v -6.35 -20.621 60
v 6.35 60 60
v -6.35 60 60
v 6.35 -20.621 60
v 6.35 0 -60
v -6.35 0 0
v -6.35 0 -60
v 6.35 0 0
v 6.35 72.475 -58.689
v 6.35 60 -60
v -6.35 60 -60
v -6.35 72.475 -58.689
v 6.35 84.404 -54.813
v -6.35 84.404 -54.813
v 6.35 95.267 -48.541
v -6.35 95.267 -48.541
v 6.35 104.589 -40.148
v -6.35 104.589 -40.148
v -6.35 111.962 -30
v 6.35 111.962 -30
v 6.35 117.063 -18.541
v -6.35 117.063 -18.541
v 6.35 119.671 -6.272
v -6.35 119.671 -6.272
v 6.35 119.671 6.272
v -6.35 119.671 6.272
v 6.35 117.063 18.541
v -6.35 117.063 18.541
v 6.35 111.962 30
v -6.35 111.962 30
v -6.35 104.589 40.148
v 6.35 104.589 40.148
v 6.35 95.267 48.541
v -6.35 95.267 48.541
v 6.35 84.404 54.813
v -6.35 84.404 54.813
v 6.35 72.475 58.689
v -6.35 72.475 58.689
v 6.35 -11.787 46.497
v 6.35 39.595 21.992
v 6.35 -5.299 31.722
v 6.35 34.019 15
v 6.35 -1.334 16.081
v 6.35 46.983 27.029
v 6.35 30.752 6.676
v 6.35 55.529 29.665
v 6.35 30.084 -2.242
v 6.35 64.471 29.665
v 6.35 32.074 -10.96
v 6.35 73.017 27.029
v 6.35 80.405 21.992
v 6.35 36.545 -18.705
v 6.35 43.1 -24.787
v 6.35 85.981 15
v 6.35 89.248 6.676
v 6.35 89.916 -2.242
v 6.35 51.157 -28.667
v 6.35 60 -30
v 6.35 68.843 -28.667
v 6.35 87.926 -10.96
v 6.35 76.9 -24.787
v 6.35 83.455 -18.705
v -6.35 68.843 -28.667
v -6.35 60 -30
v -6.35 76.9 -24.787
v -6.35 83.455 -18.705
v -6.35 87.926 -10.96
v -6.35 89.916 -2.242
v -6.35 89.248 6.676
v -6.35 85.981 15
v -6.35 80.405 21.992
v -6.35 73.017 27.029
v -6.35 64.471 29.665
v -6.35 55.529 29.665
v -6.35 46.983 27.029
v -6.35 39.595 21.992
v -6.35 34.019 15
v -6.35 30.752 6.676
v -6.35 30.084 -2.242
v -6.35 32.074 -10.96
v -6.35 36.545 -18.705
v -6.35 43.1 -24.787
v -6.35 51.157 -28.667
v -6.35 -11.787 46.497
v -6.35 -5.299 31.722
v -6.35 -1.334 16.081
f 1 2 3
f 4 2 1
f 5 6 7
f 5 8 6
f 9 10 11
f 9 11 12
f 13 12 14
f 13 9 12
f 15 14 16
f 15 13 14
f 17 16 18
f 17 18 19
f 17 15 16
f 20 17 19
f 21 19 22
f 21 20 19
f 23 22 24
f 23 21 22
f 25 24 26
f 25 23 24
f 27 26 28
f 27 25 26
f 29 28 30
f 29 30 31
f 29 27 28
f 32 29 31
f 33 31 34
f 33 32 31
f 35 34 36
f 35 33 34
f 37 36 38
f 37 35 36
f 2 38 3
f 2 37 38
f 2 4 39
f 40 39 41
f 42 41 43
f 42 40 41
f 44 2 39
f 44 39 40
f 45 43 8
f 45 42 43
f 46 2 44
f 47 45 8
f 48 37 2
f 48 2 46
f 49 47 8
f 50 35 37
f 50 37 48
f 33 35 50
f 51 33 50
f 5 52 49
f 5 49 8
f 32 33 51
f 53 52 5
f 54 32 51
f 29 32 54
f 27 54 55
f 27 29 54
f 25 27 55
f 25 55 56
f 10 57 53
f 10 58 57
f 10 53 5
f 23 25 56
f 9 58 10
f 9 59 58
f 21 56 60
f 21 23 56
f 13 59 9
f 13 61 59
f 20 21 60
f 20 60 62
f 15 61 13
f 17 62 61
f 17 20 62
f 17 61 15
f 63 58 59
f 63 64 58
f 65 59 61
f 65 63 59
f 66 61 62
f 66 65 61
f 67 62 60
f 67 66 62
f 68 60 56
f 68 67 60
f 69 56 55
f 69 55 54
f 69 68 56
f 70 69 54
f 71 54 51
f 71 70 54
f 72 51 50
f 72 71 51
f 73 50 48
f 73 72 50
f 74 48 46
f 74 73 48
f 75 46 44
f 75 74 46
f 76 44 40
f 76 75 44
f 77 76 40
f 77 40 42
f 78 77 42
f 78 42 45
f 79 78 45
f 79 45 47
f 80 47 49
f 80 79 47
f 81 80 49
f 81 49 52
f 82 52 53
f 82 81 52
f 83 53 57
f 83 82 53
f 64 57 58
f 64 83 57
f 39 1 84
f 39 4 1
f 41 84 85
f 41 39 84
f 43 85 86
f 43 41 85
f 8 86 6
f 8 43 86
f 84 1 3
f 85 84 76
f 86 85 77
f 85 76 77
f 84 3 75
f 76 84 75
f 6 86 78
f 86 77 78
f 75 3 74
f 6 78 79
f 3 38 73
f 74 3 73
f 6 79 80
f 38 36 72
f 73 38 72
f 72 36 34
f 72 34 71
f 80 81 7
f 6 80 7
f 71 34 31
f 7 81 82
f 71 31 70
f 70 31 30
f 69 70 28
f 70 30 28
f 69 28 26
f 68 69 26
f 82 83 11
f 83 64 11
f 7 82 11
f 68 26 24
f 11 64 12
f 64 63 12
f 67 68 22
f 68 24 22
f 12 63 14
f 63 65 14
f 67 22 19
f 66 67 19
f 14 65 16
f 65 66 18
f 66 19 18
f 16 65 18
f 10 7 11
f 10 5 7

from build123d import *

# Parameters (mm, degrees)
SKETCH1_R           = 30
BOSS_EXTRUDE1_DEPTH = 6.35


with BuildPart() as part:
    # Sketch1 → Boss-Extrude1 (new body, symmetric)
    with BuildSketch(Plane(origin=(0, 0, 0), x_dir=(0, 0, -1), z_dir=(1, 0, 0))):
        with BuildLine():
            Line((60, 0), (60, 60))
            ThreePointArc((60, 60), (0, 120), (-60, 60))
            Line((-60, 60), (-60, 0))
            Line((-60, 0), (-60, -20.621041836))
            ThreePointArc((-60, -20.621041836), (-31.722339788, -5.299116156), (0, 0))
            Line((0, 0), (60, 0))
        make_face()
        with Locations((0, 60)):
            Circle(SKETCH1_R, mode=Mode.SUBTRACT)
    extrude(amount=BOSS_EXTRUDE1_DEPTH, both=True)


solid = part.part
